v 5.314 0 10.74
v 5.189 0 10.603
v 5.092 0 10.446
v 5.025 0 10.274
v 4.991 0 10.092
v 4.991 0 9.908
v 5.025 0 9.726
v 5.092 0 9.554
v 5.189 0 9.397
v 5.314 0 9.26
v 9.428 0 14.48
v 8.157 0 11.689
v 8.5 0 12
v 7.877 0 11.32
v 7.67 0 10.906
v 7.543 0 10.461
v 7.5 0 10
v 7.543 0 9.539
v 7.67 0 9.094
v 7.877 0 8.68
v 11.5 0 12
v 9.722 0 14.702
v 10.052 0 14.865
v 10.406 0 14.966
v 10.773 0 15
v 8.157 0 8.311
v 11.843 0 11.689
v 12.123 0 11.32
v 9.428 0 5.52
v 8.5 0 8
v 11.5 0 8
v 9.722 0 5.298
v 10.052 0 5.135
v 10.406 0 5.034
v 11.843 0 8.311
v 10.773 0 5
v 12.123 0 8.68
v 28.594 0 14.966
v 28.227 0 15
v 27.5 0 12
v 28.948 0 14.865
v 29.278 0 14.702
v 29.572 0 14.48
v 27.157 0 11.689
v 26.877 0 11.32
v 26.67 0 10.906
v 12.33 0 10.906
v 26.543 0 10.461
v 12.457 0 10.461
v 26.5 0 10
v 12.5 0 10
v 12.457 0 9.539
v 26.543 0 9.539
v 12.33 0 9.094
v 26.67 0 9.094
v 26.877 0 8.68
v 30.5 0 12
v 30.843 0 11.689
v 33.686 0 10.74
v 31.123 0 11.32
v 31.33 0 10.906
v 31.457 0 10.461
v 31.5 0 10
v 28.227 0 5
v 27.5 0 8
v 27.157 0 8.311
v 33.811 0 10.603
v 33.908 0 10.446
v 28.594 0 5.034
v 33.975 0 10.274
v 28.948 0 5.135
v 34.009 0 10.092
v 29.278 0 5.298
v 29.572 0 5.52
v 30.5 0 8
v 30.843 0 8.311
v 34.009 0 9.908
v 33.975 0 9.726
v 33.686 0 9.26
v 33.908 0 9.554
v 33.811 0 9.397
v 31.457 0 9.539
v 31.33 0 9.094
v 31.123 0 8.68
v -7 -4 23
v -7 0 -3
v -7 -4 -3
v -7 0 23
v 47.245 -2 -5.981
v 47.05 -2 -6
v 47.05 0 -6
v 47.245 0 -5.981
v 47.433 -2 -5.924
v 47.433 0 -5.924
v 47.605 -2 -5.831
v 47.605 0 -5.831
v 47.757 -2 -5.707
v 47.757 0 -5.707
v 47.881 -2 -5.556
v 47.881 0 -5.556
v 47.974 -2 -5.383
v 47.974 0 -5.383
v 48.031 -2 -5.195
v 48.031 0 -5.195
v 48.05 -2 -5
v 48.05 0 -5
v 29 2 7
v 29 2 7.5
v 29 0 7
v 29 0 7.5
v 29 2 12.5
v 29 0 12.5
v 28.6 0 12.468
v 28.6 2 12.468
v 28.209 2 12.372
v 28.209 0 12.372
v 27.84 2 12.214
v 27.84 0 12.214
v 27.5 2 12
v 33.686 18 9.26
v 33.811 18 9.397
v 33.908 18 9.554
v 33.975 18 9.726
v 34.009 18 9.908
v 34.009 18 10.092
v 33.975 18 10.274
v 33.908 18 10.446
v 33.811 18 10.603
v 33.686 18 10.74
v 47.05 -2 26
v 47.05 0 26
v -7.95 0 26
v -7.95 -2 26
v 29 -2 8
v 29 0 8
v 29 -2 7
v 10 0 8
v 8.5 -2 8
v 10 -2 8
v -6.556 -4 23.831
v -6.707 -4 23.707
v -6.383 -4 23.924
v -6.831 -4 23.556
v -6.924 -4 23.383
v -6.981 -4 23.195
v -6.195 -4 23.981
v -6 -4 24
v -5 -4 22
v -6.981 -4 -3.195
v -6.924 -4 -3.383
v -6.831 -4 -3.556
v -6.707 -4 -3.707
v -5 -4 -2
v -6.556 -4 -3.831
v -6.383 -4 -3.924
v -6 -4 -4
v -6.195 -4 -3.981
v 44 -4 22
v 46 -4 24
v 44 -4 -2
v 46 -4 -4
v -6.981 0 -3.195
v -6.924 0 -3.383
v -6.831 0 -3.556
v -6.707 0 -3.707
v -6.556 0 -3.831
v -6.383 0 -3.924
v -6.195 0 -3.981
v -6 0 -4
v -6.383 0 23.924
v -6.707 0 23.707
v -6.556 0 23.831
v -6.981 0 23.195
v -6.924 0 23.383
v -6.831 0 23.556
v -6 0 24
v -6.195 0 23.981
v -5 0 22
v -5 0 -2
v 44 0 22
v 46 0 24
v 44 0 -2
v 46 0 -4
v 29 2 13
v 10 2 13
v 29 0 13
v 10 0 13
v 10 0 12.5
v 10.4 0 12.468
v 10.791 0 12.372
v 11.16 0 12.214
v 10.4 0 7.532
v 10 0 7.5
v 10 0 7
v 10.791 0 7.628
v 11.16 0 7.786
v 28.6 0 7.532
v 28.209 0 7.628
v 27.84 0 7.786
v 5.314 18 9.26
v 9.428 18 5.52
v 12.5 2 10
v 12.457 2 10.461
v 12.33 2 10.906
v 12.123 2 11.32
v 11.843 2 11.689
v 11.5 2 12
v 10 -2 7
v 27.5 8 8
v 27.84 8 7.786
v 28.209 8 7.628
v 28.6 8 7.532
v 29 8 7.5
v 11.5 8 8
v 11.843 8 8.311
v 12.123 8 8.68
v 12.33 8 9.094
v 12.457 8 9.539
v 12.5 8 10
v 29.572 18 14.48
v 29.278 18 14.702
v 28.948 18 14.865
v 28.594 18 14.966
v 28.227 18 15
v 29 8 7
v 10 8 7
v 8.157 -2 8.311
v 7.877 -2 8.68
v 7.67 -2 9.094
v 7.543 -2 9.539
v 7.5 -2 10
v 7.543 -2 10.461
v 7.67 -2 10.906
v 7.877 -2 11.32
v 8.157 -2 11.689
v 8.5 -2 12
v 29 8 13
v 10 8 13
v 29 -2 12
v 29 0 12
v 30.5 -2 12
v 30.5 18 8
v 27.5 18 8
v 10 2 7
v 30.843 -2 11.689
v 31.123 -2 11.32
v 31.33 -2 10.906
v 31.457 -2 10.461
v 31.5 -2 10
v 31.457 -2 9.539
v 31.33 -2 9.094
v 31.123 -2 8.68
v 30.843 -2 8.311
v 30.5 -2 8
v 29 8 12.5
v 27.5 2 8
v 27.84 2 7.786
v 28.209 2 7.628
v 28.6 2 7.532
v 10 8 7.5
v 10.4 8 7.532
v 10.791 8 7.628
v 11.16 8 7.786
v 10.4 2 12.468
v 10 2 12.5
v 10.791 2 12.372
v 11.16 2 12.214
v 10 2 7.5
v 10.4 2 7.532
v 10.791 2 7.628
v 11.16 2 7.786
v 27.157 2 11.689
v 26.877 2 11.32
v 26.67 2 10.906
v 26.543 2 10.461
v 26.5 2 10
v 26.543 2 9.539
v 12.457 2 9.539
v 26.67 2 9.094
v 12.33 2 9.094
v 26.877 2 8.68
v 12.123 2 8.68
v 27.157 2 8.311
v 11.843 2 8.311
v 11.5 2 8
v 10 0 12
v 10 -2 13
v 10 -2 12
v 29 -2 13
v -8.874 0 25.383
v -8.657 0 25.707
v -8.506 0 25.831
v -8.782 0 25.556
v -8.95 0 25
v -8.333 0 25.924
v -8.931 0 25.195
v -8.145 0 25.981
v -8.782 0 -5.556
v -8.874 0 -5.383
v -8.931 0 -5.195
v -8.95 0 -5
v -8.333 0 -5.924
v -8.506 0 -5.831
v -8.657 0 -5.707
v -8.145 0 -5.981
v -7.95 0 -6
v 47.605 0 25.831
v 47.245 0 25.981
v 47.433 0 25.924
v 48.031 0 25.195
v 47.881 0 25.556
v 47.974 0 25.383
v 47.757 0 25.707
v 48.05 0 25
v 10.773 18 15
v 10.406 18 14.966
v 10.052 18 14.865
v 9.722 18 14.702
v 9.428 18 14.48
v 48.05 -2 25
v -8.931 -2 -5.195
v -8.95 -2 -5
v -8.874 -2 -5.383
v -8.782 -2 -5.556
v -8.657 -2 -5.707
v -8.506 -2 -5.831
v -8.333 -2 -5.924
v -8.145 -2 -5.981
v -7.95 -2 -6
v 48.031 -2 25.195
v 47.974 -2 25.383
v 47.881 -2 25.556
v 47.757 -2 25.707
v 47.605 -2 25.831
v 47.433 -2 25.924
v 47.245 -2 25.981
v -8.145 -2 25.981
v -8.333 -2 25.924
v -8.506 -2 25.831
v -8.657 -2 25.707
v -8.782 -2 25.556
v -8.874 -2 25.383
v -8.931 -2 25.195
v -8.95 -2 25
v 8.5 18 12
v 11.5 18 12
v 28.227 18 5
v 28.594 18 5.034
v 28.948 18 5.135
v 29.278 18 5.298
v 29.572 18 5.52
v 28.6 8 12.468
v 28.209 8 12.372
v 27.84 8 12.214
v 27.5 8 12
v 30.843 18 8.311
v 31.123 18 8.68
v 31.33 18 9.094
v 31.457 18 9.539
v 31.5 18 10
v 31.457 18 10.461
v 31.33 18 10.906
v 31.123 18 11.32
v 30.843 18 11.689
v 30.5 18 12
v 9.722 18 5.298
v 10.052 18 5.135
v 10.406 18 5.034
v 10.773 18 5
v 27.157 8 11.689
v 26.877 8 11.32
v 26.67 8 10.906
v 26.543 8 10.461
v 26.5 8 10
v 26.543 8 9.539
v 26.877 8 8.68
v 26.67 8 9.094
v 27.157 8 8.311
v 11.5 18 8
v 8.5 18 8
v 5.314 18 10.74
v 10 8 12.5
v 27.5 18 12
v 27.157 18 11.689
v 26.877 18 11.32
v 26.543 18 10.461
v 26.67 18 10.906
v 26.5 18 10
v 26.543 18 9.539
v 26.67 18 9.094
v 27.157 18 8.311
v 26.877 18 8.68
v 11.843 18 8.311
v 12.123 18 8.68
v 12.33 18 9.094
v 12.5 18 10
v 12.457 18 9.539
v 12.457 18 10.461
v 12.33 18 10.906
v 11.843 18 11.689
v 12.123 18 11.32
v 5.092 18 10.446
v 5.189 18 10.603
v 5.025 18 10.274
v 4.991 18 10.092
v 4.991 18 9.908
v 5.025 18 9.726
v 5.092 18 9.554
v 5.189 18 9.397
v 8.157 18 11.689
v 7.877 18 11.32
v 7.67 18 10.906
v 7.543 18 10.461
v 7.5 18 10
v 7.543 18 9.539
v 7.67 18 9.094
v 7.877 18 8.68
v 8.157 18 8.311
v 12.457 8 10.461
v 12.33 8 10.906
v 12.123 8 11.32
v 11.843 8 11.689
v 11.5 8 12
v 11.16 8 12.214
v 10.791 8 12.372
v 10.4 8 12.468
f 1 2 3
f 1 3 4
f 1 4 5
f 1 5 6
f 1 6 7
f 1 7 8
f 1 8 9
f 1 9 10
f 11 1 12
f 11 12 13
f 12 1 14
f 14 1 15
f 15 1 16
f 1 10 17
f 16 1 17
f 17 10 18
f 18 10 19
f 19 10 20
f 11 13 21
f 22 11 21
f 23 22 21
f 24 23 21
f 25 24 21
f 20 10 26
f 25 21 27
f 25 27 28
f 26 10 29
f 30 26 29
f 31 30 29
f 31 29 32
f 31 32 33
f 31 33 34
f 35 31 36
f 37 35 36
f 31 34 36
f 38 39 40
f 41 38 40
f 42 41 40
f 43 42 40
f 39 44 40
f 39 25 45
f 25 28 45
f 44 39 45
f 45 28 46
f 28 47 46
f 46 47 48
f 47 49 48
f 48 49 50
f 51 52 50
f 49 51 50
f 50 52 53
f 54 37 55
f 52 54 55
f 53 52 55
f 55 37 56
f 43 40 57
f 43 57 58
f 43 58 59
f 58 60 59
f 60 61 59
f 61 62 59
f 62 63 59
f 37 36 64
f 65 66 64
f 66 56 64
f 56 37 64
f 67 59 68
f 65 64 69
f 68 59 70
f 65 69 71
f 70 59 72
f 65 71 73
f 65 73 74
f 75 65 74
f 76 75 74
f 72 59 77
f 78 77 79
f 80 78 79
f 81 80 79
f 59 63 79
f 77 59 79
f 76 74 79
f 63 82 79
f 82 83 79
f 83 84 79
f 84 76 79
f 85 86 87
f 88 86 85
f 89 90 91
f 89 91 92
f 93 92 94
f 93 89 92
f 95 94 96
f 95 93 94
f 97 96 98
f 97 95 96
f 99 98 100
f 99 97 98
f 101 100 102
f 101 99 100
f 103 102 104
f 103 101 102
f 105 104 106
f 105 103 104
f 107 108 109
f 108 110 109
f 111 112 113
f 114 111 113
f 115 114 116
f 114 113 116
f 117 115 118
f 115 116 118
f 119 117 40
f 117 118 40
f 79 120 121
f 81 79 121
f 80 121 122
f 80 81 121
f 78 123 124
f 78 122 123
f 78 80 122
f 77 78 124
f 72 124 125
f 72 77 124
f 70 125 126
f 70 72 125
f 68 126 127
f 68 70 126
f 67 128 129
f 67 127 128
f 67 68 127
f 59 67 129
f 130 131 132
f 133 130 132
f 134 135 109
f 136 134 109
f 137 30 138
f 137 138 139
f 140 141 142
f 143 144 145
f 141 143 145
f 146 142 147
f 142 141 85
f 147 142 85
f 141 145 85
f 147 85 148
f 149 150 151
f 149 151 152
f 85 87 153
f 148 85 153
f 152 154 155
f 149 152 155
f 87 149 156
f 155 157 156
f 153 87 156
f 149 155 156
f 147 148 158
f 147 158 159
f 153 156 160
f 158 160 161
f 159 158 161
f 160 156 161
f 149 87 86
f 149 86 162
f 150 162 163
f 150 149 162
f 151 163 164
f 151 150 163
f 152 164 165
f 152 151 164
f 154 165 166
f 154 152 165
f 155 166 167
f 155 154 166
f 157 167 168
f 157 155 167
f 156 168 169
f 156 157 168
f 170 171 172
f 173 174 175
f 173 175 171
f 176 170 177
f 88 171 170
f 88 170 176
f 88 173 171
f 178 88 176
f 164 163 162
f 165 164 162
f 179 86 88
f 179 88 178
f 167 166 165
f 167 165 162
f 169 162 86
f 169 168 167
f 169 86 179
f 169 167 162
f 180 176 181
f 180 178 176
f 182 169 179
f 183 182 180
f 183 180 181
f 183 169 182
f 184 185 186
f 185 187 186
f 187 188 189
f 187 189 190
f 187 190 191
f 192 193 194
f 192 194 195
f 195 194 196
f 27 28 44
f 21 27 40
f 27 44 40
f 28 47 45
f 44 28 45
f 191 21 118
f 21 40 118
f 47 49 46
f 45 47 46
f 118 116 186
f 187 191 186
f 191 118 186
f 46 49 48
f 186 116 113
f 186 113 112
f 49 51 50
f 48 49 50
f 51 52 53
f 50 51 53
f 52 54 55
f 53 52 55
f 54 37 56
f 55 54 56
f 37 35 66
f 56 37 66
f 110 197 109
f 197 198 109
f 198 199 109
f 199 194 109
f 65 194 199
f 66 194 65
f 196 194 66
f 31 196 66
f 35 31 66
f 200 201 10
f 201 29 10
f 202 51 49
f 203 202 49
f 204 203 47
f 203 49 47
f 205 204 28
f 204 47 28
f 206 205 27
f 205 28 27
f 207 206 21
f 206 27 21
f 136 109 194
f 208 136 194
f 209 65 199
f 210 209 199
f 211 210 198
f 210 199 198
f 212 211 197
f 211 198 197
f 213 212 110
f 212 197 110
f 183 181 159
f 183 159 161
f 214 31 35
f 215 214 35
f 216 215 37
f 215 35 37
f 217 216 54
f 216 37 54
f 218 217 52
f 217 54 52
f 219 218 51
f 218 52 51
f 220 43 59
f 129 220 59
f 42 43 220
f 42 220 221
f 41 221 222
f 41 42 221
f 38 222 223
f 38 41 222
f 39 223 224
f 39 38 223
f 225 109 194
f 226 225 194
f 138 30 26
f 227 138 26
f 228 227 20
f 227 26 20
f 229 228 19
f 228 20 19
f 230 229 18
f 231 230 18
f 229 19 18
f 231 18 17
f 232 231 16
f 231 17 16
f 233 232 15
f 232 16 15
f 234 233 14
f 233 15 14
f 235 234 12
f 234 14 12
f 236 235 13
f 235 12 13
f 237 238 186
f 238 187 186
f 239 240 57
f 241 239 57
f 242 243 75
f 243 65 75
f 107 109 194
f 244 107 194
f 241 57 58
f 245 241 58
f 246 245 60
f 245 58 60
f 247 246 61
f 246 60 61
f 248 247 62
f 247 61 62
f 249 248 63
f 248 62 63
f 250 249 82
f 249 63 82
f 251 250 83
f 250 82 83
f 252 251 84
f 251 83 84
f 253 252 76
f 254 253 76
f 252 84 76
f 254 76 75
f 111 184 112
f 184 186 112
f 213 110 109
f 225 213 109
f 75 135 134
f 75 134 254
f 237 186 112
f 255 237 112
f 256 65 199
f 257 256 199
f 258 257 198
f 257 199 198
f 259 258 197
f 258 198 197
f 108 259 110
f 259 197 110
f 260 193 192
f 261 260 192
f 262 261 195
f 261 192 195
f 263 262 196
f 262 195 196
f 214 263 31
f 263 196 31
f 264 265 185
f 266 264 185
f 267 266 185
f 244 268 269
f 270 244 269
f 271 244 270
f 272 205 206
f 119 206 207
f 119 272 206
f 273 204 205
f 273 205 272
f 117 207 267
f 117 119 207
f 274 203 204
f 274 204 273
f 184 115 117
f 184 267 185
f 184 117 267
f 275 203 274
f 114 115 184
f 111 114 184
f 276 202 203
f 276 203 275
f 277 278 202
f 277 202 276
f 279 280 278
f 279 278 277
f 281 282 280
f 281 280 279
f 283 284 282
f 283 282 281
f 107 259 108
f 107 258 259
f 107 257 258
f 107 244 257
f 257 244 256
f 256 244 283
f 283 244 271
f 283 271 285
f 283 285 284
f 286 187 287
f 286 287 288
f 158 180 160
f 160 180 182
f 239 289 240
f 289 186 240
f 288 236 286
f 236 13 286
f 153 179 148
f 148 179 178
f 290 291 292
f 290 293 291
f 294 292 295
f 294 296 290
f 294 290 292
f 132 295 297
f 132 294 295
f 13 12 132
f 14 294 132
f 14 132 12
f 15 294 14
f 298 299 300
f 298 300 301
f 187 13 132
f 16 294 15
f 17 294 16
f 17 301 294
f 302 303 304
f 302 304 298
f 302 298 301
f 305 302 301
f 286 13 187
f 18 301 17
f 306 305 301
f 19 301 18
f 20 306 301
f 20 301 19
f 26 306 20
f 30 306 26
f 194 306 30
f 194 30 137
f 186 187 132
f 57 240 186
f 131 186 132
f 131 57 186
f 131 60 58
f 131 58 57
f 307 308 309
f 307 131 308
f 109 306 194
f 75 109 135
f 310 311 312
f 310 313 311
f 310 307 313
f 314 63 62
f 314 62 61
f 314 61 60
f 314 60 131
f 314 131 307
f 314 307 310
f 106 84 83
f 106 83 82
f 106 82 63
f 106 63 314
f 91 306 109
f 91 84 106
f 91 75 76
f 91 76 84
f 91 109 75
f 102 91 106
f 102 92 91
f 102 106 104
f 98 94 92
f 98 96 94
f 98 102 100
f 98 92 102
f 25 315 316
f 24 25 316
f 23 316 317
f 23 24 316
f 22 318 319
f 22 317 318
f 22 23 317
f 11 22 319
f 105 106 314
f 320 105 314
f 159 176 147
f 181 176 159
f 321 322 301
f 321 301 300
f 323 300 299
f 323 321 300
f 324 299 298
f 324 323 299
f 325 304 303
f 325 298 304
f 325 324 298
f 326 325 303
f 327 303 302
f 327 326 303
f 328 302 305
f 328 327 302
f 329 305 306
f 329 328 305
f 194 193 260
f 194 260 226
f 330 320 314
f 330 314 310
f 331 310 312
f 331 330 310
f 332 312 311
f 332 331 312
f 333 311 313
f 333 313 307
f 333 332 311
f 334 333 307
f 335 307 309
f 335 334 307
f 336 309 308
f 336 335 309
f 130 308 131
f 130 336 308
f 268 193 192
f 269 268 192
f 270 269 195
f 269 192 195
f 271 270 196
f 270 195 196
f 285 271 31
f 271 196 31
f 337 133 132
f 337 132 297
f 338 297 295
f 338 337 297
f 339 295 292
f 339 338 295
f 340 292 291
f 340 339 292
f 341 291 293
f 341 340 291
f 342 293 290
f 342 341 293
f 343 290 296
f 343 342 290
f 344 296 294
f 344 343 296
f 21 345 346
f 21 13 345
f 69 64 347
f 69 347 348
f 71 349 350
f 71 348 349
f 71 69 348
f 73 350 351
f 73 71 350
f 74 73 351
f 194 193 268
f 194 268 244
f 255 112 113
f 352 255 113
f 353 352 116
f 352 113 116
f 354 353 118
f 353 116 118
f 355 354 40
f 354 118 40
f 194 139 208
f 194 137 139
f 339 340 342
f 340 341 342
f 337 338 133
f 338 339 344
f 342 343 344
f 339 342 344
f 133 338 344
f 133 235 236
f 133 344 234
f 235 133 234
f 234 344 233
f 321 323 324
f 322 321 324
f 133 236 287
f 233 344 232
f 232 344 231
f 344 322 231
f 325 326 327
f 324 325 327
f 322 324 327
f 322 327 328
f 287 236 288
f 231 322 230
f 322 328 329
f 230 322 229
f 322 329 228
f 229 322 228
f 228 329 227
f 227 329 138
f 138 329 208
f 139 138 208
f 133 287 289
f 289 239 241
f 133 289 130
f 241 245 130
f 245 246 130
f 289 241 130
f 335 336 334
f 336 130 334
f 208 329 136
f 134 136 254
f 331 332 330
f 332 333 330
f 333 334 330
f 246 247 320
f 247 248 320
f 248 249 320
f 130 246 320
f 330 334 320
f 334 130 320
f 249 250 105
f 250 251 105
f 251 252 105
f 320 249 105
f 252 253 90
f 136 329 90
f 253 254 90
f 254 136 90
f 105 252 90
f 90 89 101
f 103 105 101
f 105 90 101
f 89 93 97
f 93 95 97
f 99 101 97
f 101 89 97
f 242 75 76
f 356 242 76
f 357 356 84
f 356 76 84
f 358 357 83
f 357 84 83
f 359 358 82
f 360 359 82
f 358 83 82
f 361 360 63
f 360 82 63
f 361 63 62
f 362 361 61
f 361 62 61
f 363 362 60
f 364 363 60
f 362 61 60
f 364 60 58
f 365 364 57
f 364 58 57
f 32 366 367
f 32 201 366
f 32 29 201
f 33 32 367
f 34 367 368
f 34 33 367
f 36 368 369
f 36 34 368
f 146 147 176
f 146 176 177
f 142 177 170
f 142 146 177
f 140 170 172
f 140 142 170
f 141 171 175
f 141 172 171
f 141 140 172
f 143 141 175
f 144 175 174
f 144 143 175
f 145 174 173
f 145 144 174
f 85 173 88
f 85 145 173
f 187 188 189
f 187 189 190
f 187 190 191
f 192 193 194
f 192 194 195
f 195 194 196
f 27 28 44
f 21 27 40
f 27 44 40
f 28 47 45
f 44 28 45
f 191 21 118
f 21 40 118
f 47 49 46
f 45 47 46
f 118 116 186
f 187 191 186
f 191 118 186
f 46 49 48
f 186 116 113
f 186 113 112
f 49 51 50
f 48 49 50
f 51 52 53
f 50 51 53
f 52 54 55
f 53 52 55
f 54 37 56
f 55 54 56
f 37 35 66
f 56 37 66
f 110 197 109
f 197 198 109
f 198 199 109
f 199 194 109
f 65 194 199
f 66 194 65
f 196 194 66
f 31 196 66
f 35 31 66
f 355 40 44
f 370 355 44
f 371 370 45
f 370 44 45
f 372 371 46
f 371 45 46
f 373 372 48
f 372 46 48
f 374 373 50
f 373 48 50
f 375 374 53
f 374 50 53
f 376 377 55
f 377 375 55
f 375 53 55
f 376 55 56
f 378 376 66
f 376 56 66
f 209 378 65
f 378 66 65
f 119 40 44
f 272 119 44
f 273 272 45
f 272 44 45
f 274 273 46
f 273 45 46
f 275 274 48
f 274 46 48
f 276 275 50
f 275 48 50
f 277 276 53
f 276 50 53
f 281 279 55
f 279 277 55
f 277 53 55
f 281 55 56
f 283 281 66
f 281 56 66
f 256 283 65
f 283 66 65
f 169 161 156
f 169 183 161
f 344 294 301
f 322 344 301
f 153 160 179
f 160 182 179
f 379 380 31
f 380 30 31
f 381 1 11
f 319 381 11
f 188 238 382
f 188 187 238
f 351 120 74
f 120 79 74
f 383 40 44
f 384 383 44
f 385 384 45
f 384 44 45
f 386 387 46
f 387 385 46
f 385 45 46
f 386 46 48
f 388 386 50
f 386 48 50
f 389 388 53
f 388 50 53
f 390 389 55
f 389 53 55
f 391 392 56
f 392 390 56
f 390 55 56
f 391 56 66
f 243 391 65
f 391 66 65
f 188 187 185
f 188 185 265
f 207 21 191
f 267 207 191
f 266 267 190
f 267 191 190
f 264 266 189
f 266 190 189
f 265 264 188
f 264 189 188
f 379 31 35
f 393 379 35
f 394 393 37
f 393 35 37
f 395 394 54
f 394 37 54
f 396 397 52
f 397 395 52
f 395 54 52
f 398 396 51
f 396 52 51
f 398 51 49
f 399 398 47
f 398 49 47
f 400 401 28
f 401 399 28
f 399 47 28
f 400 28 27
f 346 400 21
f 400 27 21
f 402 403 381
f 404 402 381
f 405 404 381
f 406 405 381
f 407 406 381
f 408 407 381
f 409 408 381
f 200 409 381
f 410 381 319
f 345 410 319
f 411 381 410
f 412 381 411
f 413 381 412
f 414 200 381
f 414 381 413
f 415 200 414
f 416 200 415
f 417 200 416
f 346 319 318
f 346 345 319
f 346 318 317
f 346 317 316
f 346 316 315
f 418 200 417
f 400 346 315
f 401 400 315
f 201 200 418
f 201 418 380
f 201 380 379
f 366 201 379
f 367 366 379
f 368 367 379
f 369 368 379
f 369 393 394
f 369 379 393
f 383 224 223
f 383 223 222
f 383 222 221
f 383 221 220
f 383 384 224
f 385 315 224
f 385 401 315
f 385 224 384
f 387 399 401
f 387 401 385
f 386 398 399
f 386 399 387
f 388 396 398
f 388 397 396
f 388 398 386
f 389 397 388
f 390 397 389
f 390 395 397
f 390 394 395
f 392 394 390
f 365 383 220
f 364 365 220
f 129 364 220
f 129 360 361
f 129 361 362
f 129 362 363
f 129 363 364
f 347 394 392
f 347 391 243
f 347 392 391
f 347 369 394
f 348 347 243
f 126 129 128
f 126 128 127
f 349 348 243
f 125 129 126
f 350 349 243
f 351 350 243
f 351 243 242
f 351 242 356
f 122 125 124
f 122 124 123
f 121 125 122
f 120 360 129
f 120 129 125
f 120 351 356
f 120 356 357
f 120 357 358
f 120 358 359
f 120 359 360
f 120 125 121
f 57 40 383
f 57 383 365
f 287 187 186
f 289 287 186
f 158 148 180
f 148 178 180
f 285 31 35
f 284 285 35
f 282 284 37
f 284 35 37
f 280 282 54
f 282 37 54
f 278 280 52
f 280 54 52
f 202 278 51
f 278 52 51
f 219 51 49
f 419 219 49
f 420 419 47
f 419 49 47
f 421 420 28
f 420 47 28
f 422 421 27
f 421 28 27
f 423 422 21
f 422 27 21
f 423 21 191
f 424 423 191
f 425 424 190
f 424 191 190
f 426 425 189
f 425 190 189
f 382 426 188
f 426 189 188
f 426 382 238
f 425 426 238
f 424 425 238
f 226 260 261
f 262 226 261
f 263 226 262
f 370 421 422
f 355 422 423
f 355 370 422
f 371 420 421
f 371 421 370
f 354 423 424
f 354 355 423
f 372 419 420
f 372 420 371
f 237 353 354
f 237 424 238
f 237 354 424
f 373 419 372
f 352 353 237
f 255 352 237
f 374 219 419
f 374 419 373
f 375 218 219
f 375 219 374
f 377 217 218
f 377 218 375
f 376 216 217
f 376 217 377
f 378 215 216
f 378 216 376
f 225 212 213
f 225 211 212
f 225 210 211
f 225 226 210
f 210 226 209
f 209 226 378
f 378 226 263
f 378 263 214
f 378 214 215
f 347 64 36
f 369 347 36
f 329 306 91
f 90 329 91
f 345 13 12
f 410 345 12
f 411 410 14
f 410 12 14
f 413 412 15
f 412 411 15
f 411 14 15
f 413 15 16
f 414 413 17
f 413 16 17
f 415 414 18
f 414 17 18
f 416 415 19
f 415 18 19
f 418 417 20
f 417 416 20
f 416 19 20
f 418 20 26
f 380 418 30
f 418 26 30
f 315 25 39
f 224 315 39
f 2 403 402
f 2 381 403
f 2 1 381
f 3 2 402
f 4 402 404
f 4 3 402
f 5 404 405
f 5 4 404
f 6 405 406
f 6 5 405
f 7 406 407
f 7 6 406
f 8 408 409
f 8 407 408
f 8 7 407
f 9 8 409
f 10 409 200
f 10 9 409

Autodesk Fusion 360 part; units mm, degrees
sketch "Esquisse1" plane through (0, 0, 0) normal (0, 1, 0) x (1, 0, 0)
  circle A0 centre (10, -10) radius 2.5
  line L0 (8.5, -12) -> (11.5, -12)
  line L1 (8.5, -8) -> (11.5, -8)
  circle A1 centre (29, -10) radius 2.5
  line L2 (27.5, -12) -> (30.5, -12)
  line L3 (27.5, -8) -> (30.5, -8)
  line L4 (5.3139, -10.7399) -> (9.4279, -14.4799)
  line L5 (10.7732, -15) -> (28.2268, -15)
  line L6 (29.5721, -14.4799) -> (33.6861, -10.7399)
  line L7 (33.6861, -9.2601) -> (29.5721, -5.5201)
  line L8 (28.2268, -5) -> (10.7732, -5)
  line L9 (9.4279, -5.5201) -> (5.3139, -9.2601)
  arc A2 (9.4279, -14.4799) -> (10.7732, -15) centre (10.7732, -13) ccw
  arc A3 (28.2268, -15) -> (29.5721, -14.4799) centre (28.2268, -13) ccw
  arc A4 (29.5721, -5.5201) -> (28.2268, -5) centre (28.2268, -7) ccw
  arc A5 (10.7732, -5) -> (9.4279, -5.5201) centre (10.7732, -7) ccw
  arc A6 (5.3139, -9.2601) -> (5.3139, -10.7399) centre (5.9866, -10) ccw
  arc A7 (33.6861, -10.7399) -> (33.6861, -9.2601) centre (33.0134, -10) ccw
  line L10 (-8.9501, 6) -> (48.0499, 6)
  line L11 (48.0499, 6) -> (48.0499, -26)
  line L12 (48.0499, -26) -> (-8.9501, -26)
  line L13 (-8.9501, -26) -> (-8.9501, 6)
  line L14 (-7, -24) -> (46, -24)
  line L15 (46, -24) -> (46, 4)
  line L16 (46, 4) -> (-7, 4)
  line L17 (-7, 4) -> (-7, -24)
  line L18 (-5, -22) -> (44, -22)
  line L19 (44, -22) -> (44, 2)
  line L20 (44, 2) -> (-5, 2)
  line L21 (-5, 2) -> (-5, -22)
  line L22 (10, -12) -> (8.5, -12)
  line L23 (10, -13) -> (29, -13)
  line L24 (29, -7) -> (10, -7)
  line L25 (10, -13) -> (10, -7)
  line L26 (29, -13) -> (29, -7)
extrude "Extrusion23" add sketch "Esquisse1" against normal blind 2 contours A0 L1 L25 | A0 L0 L22 L25 | A1 L3 L26 | A1 L2 L26 | L4 L5 L6 L7 L8 L9 A2 A3 A4 A5 A6 A7 | L10 L11 L12 L13 | L14 L15 L16 L17 | L18 L19 L20 L21 picked at (9.893, -7.6736) picked at (29.107, -7.6736) picked at (29.107, -12.3264) makes body 1
extrude "Extrusion24" add sketch "Esquisse1" against normal blind 4 separate body contours L14 L15 L16 L17 makes body 2
extrude "Extrusion25" add sketch "Esquisse1" along normal blind 18 separate body contours A0 A1 L23 L24 L25 L26 | A0 L1 L25 | A0 L0 L25 | A0 L1 L25 | A0 L0 L22 L25 | A1 L3 L26 | A1 L3 L26 | A1 L2 L26 | A1 L2 L26 | L4 L5 L6 L7 L8 L9 A2 A3 A4 A5 A6 A7 makes body 3
extrude "Extrusion26" add sketch "Esquisse1" along normal blind 8 separate body contours A0 A1 L23 L24 L25 L26 makes body 4
extrude "Extrusion27" add sketch "Esquisse1" along normal blind 2 separate body contours A0 A1 L23 L24 L25 L26 makes body 5
fillet "Congé5" radius 1 1 edges at (-8.9501, -1, -6) on bodies 1
fillet "Congé6" radius 1 1 edges at (48.0499, -1, -6) on bodies 1
fillet "Congé7" radius 1 1 edges at (48.0499, -1, 26) on bodies 1
fillet "Congé8" radius 1 1 edges at (-8.9501, -1, 26) on bodies 1
fillet "Congé9" radius 1 1 edges at (-7, -2, -4) on bodies 2
fillet "Congé10" radius 1 1 edges at (-7, -2, 24) on bodies 2
